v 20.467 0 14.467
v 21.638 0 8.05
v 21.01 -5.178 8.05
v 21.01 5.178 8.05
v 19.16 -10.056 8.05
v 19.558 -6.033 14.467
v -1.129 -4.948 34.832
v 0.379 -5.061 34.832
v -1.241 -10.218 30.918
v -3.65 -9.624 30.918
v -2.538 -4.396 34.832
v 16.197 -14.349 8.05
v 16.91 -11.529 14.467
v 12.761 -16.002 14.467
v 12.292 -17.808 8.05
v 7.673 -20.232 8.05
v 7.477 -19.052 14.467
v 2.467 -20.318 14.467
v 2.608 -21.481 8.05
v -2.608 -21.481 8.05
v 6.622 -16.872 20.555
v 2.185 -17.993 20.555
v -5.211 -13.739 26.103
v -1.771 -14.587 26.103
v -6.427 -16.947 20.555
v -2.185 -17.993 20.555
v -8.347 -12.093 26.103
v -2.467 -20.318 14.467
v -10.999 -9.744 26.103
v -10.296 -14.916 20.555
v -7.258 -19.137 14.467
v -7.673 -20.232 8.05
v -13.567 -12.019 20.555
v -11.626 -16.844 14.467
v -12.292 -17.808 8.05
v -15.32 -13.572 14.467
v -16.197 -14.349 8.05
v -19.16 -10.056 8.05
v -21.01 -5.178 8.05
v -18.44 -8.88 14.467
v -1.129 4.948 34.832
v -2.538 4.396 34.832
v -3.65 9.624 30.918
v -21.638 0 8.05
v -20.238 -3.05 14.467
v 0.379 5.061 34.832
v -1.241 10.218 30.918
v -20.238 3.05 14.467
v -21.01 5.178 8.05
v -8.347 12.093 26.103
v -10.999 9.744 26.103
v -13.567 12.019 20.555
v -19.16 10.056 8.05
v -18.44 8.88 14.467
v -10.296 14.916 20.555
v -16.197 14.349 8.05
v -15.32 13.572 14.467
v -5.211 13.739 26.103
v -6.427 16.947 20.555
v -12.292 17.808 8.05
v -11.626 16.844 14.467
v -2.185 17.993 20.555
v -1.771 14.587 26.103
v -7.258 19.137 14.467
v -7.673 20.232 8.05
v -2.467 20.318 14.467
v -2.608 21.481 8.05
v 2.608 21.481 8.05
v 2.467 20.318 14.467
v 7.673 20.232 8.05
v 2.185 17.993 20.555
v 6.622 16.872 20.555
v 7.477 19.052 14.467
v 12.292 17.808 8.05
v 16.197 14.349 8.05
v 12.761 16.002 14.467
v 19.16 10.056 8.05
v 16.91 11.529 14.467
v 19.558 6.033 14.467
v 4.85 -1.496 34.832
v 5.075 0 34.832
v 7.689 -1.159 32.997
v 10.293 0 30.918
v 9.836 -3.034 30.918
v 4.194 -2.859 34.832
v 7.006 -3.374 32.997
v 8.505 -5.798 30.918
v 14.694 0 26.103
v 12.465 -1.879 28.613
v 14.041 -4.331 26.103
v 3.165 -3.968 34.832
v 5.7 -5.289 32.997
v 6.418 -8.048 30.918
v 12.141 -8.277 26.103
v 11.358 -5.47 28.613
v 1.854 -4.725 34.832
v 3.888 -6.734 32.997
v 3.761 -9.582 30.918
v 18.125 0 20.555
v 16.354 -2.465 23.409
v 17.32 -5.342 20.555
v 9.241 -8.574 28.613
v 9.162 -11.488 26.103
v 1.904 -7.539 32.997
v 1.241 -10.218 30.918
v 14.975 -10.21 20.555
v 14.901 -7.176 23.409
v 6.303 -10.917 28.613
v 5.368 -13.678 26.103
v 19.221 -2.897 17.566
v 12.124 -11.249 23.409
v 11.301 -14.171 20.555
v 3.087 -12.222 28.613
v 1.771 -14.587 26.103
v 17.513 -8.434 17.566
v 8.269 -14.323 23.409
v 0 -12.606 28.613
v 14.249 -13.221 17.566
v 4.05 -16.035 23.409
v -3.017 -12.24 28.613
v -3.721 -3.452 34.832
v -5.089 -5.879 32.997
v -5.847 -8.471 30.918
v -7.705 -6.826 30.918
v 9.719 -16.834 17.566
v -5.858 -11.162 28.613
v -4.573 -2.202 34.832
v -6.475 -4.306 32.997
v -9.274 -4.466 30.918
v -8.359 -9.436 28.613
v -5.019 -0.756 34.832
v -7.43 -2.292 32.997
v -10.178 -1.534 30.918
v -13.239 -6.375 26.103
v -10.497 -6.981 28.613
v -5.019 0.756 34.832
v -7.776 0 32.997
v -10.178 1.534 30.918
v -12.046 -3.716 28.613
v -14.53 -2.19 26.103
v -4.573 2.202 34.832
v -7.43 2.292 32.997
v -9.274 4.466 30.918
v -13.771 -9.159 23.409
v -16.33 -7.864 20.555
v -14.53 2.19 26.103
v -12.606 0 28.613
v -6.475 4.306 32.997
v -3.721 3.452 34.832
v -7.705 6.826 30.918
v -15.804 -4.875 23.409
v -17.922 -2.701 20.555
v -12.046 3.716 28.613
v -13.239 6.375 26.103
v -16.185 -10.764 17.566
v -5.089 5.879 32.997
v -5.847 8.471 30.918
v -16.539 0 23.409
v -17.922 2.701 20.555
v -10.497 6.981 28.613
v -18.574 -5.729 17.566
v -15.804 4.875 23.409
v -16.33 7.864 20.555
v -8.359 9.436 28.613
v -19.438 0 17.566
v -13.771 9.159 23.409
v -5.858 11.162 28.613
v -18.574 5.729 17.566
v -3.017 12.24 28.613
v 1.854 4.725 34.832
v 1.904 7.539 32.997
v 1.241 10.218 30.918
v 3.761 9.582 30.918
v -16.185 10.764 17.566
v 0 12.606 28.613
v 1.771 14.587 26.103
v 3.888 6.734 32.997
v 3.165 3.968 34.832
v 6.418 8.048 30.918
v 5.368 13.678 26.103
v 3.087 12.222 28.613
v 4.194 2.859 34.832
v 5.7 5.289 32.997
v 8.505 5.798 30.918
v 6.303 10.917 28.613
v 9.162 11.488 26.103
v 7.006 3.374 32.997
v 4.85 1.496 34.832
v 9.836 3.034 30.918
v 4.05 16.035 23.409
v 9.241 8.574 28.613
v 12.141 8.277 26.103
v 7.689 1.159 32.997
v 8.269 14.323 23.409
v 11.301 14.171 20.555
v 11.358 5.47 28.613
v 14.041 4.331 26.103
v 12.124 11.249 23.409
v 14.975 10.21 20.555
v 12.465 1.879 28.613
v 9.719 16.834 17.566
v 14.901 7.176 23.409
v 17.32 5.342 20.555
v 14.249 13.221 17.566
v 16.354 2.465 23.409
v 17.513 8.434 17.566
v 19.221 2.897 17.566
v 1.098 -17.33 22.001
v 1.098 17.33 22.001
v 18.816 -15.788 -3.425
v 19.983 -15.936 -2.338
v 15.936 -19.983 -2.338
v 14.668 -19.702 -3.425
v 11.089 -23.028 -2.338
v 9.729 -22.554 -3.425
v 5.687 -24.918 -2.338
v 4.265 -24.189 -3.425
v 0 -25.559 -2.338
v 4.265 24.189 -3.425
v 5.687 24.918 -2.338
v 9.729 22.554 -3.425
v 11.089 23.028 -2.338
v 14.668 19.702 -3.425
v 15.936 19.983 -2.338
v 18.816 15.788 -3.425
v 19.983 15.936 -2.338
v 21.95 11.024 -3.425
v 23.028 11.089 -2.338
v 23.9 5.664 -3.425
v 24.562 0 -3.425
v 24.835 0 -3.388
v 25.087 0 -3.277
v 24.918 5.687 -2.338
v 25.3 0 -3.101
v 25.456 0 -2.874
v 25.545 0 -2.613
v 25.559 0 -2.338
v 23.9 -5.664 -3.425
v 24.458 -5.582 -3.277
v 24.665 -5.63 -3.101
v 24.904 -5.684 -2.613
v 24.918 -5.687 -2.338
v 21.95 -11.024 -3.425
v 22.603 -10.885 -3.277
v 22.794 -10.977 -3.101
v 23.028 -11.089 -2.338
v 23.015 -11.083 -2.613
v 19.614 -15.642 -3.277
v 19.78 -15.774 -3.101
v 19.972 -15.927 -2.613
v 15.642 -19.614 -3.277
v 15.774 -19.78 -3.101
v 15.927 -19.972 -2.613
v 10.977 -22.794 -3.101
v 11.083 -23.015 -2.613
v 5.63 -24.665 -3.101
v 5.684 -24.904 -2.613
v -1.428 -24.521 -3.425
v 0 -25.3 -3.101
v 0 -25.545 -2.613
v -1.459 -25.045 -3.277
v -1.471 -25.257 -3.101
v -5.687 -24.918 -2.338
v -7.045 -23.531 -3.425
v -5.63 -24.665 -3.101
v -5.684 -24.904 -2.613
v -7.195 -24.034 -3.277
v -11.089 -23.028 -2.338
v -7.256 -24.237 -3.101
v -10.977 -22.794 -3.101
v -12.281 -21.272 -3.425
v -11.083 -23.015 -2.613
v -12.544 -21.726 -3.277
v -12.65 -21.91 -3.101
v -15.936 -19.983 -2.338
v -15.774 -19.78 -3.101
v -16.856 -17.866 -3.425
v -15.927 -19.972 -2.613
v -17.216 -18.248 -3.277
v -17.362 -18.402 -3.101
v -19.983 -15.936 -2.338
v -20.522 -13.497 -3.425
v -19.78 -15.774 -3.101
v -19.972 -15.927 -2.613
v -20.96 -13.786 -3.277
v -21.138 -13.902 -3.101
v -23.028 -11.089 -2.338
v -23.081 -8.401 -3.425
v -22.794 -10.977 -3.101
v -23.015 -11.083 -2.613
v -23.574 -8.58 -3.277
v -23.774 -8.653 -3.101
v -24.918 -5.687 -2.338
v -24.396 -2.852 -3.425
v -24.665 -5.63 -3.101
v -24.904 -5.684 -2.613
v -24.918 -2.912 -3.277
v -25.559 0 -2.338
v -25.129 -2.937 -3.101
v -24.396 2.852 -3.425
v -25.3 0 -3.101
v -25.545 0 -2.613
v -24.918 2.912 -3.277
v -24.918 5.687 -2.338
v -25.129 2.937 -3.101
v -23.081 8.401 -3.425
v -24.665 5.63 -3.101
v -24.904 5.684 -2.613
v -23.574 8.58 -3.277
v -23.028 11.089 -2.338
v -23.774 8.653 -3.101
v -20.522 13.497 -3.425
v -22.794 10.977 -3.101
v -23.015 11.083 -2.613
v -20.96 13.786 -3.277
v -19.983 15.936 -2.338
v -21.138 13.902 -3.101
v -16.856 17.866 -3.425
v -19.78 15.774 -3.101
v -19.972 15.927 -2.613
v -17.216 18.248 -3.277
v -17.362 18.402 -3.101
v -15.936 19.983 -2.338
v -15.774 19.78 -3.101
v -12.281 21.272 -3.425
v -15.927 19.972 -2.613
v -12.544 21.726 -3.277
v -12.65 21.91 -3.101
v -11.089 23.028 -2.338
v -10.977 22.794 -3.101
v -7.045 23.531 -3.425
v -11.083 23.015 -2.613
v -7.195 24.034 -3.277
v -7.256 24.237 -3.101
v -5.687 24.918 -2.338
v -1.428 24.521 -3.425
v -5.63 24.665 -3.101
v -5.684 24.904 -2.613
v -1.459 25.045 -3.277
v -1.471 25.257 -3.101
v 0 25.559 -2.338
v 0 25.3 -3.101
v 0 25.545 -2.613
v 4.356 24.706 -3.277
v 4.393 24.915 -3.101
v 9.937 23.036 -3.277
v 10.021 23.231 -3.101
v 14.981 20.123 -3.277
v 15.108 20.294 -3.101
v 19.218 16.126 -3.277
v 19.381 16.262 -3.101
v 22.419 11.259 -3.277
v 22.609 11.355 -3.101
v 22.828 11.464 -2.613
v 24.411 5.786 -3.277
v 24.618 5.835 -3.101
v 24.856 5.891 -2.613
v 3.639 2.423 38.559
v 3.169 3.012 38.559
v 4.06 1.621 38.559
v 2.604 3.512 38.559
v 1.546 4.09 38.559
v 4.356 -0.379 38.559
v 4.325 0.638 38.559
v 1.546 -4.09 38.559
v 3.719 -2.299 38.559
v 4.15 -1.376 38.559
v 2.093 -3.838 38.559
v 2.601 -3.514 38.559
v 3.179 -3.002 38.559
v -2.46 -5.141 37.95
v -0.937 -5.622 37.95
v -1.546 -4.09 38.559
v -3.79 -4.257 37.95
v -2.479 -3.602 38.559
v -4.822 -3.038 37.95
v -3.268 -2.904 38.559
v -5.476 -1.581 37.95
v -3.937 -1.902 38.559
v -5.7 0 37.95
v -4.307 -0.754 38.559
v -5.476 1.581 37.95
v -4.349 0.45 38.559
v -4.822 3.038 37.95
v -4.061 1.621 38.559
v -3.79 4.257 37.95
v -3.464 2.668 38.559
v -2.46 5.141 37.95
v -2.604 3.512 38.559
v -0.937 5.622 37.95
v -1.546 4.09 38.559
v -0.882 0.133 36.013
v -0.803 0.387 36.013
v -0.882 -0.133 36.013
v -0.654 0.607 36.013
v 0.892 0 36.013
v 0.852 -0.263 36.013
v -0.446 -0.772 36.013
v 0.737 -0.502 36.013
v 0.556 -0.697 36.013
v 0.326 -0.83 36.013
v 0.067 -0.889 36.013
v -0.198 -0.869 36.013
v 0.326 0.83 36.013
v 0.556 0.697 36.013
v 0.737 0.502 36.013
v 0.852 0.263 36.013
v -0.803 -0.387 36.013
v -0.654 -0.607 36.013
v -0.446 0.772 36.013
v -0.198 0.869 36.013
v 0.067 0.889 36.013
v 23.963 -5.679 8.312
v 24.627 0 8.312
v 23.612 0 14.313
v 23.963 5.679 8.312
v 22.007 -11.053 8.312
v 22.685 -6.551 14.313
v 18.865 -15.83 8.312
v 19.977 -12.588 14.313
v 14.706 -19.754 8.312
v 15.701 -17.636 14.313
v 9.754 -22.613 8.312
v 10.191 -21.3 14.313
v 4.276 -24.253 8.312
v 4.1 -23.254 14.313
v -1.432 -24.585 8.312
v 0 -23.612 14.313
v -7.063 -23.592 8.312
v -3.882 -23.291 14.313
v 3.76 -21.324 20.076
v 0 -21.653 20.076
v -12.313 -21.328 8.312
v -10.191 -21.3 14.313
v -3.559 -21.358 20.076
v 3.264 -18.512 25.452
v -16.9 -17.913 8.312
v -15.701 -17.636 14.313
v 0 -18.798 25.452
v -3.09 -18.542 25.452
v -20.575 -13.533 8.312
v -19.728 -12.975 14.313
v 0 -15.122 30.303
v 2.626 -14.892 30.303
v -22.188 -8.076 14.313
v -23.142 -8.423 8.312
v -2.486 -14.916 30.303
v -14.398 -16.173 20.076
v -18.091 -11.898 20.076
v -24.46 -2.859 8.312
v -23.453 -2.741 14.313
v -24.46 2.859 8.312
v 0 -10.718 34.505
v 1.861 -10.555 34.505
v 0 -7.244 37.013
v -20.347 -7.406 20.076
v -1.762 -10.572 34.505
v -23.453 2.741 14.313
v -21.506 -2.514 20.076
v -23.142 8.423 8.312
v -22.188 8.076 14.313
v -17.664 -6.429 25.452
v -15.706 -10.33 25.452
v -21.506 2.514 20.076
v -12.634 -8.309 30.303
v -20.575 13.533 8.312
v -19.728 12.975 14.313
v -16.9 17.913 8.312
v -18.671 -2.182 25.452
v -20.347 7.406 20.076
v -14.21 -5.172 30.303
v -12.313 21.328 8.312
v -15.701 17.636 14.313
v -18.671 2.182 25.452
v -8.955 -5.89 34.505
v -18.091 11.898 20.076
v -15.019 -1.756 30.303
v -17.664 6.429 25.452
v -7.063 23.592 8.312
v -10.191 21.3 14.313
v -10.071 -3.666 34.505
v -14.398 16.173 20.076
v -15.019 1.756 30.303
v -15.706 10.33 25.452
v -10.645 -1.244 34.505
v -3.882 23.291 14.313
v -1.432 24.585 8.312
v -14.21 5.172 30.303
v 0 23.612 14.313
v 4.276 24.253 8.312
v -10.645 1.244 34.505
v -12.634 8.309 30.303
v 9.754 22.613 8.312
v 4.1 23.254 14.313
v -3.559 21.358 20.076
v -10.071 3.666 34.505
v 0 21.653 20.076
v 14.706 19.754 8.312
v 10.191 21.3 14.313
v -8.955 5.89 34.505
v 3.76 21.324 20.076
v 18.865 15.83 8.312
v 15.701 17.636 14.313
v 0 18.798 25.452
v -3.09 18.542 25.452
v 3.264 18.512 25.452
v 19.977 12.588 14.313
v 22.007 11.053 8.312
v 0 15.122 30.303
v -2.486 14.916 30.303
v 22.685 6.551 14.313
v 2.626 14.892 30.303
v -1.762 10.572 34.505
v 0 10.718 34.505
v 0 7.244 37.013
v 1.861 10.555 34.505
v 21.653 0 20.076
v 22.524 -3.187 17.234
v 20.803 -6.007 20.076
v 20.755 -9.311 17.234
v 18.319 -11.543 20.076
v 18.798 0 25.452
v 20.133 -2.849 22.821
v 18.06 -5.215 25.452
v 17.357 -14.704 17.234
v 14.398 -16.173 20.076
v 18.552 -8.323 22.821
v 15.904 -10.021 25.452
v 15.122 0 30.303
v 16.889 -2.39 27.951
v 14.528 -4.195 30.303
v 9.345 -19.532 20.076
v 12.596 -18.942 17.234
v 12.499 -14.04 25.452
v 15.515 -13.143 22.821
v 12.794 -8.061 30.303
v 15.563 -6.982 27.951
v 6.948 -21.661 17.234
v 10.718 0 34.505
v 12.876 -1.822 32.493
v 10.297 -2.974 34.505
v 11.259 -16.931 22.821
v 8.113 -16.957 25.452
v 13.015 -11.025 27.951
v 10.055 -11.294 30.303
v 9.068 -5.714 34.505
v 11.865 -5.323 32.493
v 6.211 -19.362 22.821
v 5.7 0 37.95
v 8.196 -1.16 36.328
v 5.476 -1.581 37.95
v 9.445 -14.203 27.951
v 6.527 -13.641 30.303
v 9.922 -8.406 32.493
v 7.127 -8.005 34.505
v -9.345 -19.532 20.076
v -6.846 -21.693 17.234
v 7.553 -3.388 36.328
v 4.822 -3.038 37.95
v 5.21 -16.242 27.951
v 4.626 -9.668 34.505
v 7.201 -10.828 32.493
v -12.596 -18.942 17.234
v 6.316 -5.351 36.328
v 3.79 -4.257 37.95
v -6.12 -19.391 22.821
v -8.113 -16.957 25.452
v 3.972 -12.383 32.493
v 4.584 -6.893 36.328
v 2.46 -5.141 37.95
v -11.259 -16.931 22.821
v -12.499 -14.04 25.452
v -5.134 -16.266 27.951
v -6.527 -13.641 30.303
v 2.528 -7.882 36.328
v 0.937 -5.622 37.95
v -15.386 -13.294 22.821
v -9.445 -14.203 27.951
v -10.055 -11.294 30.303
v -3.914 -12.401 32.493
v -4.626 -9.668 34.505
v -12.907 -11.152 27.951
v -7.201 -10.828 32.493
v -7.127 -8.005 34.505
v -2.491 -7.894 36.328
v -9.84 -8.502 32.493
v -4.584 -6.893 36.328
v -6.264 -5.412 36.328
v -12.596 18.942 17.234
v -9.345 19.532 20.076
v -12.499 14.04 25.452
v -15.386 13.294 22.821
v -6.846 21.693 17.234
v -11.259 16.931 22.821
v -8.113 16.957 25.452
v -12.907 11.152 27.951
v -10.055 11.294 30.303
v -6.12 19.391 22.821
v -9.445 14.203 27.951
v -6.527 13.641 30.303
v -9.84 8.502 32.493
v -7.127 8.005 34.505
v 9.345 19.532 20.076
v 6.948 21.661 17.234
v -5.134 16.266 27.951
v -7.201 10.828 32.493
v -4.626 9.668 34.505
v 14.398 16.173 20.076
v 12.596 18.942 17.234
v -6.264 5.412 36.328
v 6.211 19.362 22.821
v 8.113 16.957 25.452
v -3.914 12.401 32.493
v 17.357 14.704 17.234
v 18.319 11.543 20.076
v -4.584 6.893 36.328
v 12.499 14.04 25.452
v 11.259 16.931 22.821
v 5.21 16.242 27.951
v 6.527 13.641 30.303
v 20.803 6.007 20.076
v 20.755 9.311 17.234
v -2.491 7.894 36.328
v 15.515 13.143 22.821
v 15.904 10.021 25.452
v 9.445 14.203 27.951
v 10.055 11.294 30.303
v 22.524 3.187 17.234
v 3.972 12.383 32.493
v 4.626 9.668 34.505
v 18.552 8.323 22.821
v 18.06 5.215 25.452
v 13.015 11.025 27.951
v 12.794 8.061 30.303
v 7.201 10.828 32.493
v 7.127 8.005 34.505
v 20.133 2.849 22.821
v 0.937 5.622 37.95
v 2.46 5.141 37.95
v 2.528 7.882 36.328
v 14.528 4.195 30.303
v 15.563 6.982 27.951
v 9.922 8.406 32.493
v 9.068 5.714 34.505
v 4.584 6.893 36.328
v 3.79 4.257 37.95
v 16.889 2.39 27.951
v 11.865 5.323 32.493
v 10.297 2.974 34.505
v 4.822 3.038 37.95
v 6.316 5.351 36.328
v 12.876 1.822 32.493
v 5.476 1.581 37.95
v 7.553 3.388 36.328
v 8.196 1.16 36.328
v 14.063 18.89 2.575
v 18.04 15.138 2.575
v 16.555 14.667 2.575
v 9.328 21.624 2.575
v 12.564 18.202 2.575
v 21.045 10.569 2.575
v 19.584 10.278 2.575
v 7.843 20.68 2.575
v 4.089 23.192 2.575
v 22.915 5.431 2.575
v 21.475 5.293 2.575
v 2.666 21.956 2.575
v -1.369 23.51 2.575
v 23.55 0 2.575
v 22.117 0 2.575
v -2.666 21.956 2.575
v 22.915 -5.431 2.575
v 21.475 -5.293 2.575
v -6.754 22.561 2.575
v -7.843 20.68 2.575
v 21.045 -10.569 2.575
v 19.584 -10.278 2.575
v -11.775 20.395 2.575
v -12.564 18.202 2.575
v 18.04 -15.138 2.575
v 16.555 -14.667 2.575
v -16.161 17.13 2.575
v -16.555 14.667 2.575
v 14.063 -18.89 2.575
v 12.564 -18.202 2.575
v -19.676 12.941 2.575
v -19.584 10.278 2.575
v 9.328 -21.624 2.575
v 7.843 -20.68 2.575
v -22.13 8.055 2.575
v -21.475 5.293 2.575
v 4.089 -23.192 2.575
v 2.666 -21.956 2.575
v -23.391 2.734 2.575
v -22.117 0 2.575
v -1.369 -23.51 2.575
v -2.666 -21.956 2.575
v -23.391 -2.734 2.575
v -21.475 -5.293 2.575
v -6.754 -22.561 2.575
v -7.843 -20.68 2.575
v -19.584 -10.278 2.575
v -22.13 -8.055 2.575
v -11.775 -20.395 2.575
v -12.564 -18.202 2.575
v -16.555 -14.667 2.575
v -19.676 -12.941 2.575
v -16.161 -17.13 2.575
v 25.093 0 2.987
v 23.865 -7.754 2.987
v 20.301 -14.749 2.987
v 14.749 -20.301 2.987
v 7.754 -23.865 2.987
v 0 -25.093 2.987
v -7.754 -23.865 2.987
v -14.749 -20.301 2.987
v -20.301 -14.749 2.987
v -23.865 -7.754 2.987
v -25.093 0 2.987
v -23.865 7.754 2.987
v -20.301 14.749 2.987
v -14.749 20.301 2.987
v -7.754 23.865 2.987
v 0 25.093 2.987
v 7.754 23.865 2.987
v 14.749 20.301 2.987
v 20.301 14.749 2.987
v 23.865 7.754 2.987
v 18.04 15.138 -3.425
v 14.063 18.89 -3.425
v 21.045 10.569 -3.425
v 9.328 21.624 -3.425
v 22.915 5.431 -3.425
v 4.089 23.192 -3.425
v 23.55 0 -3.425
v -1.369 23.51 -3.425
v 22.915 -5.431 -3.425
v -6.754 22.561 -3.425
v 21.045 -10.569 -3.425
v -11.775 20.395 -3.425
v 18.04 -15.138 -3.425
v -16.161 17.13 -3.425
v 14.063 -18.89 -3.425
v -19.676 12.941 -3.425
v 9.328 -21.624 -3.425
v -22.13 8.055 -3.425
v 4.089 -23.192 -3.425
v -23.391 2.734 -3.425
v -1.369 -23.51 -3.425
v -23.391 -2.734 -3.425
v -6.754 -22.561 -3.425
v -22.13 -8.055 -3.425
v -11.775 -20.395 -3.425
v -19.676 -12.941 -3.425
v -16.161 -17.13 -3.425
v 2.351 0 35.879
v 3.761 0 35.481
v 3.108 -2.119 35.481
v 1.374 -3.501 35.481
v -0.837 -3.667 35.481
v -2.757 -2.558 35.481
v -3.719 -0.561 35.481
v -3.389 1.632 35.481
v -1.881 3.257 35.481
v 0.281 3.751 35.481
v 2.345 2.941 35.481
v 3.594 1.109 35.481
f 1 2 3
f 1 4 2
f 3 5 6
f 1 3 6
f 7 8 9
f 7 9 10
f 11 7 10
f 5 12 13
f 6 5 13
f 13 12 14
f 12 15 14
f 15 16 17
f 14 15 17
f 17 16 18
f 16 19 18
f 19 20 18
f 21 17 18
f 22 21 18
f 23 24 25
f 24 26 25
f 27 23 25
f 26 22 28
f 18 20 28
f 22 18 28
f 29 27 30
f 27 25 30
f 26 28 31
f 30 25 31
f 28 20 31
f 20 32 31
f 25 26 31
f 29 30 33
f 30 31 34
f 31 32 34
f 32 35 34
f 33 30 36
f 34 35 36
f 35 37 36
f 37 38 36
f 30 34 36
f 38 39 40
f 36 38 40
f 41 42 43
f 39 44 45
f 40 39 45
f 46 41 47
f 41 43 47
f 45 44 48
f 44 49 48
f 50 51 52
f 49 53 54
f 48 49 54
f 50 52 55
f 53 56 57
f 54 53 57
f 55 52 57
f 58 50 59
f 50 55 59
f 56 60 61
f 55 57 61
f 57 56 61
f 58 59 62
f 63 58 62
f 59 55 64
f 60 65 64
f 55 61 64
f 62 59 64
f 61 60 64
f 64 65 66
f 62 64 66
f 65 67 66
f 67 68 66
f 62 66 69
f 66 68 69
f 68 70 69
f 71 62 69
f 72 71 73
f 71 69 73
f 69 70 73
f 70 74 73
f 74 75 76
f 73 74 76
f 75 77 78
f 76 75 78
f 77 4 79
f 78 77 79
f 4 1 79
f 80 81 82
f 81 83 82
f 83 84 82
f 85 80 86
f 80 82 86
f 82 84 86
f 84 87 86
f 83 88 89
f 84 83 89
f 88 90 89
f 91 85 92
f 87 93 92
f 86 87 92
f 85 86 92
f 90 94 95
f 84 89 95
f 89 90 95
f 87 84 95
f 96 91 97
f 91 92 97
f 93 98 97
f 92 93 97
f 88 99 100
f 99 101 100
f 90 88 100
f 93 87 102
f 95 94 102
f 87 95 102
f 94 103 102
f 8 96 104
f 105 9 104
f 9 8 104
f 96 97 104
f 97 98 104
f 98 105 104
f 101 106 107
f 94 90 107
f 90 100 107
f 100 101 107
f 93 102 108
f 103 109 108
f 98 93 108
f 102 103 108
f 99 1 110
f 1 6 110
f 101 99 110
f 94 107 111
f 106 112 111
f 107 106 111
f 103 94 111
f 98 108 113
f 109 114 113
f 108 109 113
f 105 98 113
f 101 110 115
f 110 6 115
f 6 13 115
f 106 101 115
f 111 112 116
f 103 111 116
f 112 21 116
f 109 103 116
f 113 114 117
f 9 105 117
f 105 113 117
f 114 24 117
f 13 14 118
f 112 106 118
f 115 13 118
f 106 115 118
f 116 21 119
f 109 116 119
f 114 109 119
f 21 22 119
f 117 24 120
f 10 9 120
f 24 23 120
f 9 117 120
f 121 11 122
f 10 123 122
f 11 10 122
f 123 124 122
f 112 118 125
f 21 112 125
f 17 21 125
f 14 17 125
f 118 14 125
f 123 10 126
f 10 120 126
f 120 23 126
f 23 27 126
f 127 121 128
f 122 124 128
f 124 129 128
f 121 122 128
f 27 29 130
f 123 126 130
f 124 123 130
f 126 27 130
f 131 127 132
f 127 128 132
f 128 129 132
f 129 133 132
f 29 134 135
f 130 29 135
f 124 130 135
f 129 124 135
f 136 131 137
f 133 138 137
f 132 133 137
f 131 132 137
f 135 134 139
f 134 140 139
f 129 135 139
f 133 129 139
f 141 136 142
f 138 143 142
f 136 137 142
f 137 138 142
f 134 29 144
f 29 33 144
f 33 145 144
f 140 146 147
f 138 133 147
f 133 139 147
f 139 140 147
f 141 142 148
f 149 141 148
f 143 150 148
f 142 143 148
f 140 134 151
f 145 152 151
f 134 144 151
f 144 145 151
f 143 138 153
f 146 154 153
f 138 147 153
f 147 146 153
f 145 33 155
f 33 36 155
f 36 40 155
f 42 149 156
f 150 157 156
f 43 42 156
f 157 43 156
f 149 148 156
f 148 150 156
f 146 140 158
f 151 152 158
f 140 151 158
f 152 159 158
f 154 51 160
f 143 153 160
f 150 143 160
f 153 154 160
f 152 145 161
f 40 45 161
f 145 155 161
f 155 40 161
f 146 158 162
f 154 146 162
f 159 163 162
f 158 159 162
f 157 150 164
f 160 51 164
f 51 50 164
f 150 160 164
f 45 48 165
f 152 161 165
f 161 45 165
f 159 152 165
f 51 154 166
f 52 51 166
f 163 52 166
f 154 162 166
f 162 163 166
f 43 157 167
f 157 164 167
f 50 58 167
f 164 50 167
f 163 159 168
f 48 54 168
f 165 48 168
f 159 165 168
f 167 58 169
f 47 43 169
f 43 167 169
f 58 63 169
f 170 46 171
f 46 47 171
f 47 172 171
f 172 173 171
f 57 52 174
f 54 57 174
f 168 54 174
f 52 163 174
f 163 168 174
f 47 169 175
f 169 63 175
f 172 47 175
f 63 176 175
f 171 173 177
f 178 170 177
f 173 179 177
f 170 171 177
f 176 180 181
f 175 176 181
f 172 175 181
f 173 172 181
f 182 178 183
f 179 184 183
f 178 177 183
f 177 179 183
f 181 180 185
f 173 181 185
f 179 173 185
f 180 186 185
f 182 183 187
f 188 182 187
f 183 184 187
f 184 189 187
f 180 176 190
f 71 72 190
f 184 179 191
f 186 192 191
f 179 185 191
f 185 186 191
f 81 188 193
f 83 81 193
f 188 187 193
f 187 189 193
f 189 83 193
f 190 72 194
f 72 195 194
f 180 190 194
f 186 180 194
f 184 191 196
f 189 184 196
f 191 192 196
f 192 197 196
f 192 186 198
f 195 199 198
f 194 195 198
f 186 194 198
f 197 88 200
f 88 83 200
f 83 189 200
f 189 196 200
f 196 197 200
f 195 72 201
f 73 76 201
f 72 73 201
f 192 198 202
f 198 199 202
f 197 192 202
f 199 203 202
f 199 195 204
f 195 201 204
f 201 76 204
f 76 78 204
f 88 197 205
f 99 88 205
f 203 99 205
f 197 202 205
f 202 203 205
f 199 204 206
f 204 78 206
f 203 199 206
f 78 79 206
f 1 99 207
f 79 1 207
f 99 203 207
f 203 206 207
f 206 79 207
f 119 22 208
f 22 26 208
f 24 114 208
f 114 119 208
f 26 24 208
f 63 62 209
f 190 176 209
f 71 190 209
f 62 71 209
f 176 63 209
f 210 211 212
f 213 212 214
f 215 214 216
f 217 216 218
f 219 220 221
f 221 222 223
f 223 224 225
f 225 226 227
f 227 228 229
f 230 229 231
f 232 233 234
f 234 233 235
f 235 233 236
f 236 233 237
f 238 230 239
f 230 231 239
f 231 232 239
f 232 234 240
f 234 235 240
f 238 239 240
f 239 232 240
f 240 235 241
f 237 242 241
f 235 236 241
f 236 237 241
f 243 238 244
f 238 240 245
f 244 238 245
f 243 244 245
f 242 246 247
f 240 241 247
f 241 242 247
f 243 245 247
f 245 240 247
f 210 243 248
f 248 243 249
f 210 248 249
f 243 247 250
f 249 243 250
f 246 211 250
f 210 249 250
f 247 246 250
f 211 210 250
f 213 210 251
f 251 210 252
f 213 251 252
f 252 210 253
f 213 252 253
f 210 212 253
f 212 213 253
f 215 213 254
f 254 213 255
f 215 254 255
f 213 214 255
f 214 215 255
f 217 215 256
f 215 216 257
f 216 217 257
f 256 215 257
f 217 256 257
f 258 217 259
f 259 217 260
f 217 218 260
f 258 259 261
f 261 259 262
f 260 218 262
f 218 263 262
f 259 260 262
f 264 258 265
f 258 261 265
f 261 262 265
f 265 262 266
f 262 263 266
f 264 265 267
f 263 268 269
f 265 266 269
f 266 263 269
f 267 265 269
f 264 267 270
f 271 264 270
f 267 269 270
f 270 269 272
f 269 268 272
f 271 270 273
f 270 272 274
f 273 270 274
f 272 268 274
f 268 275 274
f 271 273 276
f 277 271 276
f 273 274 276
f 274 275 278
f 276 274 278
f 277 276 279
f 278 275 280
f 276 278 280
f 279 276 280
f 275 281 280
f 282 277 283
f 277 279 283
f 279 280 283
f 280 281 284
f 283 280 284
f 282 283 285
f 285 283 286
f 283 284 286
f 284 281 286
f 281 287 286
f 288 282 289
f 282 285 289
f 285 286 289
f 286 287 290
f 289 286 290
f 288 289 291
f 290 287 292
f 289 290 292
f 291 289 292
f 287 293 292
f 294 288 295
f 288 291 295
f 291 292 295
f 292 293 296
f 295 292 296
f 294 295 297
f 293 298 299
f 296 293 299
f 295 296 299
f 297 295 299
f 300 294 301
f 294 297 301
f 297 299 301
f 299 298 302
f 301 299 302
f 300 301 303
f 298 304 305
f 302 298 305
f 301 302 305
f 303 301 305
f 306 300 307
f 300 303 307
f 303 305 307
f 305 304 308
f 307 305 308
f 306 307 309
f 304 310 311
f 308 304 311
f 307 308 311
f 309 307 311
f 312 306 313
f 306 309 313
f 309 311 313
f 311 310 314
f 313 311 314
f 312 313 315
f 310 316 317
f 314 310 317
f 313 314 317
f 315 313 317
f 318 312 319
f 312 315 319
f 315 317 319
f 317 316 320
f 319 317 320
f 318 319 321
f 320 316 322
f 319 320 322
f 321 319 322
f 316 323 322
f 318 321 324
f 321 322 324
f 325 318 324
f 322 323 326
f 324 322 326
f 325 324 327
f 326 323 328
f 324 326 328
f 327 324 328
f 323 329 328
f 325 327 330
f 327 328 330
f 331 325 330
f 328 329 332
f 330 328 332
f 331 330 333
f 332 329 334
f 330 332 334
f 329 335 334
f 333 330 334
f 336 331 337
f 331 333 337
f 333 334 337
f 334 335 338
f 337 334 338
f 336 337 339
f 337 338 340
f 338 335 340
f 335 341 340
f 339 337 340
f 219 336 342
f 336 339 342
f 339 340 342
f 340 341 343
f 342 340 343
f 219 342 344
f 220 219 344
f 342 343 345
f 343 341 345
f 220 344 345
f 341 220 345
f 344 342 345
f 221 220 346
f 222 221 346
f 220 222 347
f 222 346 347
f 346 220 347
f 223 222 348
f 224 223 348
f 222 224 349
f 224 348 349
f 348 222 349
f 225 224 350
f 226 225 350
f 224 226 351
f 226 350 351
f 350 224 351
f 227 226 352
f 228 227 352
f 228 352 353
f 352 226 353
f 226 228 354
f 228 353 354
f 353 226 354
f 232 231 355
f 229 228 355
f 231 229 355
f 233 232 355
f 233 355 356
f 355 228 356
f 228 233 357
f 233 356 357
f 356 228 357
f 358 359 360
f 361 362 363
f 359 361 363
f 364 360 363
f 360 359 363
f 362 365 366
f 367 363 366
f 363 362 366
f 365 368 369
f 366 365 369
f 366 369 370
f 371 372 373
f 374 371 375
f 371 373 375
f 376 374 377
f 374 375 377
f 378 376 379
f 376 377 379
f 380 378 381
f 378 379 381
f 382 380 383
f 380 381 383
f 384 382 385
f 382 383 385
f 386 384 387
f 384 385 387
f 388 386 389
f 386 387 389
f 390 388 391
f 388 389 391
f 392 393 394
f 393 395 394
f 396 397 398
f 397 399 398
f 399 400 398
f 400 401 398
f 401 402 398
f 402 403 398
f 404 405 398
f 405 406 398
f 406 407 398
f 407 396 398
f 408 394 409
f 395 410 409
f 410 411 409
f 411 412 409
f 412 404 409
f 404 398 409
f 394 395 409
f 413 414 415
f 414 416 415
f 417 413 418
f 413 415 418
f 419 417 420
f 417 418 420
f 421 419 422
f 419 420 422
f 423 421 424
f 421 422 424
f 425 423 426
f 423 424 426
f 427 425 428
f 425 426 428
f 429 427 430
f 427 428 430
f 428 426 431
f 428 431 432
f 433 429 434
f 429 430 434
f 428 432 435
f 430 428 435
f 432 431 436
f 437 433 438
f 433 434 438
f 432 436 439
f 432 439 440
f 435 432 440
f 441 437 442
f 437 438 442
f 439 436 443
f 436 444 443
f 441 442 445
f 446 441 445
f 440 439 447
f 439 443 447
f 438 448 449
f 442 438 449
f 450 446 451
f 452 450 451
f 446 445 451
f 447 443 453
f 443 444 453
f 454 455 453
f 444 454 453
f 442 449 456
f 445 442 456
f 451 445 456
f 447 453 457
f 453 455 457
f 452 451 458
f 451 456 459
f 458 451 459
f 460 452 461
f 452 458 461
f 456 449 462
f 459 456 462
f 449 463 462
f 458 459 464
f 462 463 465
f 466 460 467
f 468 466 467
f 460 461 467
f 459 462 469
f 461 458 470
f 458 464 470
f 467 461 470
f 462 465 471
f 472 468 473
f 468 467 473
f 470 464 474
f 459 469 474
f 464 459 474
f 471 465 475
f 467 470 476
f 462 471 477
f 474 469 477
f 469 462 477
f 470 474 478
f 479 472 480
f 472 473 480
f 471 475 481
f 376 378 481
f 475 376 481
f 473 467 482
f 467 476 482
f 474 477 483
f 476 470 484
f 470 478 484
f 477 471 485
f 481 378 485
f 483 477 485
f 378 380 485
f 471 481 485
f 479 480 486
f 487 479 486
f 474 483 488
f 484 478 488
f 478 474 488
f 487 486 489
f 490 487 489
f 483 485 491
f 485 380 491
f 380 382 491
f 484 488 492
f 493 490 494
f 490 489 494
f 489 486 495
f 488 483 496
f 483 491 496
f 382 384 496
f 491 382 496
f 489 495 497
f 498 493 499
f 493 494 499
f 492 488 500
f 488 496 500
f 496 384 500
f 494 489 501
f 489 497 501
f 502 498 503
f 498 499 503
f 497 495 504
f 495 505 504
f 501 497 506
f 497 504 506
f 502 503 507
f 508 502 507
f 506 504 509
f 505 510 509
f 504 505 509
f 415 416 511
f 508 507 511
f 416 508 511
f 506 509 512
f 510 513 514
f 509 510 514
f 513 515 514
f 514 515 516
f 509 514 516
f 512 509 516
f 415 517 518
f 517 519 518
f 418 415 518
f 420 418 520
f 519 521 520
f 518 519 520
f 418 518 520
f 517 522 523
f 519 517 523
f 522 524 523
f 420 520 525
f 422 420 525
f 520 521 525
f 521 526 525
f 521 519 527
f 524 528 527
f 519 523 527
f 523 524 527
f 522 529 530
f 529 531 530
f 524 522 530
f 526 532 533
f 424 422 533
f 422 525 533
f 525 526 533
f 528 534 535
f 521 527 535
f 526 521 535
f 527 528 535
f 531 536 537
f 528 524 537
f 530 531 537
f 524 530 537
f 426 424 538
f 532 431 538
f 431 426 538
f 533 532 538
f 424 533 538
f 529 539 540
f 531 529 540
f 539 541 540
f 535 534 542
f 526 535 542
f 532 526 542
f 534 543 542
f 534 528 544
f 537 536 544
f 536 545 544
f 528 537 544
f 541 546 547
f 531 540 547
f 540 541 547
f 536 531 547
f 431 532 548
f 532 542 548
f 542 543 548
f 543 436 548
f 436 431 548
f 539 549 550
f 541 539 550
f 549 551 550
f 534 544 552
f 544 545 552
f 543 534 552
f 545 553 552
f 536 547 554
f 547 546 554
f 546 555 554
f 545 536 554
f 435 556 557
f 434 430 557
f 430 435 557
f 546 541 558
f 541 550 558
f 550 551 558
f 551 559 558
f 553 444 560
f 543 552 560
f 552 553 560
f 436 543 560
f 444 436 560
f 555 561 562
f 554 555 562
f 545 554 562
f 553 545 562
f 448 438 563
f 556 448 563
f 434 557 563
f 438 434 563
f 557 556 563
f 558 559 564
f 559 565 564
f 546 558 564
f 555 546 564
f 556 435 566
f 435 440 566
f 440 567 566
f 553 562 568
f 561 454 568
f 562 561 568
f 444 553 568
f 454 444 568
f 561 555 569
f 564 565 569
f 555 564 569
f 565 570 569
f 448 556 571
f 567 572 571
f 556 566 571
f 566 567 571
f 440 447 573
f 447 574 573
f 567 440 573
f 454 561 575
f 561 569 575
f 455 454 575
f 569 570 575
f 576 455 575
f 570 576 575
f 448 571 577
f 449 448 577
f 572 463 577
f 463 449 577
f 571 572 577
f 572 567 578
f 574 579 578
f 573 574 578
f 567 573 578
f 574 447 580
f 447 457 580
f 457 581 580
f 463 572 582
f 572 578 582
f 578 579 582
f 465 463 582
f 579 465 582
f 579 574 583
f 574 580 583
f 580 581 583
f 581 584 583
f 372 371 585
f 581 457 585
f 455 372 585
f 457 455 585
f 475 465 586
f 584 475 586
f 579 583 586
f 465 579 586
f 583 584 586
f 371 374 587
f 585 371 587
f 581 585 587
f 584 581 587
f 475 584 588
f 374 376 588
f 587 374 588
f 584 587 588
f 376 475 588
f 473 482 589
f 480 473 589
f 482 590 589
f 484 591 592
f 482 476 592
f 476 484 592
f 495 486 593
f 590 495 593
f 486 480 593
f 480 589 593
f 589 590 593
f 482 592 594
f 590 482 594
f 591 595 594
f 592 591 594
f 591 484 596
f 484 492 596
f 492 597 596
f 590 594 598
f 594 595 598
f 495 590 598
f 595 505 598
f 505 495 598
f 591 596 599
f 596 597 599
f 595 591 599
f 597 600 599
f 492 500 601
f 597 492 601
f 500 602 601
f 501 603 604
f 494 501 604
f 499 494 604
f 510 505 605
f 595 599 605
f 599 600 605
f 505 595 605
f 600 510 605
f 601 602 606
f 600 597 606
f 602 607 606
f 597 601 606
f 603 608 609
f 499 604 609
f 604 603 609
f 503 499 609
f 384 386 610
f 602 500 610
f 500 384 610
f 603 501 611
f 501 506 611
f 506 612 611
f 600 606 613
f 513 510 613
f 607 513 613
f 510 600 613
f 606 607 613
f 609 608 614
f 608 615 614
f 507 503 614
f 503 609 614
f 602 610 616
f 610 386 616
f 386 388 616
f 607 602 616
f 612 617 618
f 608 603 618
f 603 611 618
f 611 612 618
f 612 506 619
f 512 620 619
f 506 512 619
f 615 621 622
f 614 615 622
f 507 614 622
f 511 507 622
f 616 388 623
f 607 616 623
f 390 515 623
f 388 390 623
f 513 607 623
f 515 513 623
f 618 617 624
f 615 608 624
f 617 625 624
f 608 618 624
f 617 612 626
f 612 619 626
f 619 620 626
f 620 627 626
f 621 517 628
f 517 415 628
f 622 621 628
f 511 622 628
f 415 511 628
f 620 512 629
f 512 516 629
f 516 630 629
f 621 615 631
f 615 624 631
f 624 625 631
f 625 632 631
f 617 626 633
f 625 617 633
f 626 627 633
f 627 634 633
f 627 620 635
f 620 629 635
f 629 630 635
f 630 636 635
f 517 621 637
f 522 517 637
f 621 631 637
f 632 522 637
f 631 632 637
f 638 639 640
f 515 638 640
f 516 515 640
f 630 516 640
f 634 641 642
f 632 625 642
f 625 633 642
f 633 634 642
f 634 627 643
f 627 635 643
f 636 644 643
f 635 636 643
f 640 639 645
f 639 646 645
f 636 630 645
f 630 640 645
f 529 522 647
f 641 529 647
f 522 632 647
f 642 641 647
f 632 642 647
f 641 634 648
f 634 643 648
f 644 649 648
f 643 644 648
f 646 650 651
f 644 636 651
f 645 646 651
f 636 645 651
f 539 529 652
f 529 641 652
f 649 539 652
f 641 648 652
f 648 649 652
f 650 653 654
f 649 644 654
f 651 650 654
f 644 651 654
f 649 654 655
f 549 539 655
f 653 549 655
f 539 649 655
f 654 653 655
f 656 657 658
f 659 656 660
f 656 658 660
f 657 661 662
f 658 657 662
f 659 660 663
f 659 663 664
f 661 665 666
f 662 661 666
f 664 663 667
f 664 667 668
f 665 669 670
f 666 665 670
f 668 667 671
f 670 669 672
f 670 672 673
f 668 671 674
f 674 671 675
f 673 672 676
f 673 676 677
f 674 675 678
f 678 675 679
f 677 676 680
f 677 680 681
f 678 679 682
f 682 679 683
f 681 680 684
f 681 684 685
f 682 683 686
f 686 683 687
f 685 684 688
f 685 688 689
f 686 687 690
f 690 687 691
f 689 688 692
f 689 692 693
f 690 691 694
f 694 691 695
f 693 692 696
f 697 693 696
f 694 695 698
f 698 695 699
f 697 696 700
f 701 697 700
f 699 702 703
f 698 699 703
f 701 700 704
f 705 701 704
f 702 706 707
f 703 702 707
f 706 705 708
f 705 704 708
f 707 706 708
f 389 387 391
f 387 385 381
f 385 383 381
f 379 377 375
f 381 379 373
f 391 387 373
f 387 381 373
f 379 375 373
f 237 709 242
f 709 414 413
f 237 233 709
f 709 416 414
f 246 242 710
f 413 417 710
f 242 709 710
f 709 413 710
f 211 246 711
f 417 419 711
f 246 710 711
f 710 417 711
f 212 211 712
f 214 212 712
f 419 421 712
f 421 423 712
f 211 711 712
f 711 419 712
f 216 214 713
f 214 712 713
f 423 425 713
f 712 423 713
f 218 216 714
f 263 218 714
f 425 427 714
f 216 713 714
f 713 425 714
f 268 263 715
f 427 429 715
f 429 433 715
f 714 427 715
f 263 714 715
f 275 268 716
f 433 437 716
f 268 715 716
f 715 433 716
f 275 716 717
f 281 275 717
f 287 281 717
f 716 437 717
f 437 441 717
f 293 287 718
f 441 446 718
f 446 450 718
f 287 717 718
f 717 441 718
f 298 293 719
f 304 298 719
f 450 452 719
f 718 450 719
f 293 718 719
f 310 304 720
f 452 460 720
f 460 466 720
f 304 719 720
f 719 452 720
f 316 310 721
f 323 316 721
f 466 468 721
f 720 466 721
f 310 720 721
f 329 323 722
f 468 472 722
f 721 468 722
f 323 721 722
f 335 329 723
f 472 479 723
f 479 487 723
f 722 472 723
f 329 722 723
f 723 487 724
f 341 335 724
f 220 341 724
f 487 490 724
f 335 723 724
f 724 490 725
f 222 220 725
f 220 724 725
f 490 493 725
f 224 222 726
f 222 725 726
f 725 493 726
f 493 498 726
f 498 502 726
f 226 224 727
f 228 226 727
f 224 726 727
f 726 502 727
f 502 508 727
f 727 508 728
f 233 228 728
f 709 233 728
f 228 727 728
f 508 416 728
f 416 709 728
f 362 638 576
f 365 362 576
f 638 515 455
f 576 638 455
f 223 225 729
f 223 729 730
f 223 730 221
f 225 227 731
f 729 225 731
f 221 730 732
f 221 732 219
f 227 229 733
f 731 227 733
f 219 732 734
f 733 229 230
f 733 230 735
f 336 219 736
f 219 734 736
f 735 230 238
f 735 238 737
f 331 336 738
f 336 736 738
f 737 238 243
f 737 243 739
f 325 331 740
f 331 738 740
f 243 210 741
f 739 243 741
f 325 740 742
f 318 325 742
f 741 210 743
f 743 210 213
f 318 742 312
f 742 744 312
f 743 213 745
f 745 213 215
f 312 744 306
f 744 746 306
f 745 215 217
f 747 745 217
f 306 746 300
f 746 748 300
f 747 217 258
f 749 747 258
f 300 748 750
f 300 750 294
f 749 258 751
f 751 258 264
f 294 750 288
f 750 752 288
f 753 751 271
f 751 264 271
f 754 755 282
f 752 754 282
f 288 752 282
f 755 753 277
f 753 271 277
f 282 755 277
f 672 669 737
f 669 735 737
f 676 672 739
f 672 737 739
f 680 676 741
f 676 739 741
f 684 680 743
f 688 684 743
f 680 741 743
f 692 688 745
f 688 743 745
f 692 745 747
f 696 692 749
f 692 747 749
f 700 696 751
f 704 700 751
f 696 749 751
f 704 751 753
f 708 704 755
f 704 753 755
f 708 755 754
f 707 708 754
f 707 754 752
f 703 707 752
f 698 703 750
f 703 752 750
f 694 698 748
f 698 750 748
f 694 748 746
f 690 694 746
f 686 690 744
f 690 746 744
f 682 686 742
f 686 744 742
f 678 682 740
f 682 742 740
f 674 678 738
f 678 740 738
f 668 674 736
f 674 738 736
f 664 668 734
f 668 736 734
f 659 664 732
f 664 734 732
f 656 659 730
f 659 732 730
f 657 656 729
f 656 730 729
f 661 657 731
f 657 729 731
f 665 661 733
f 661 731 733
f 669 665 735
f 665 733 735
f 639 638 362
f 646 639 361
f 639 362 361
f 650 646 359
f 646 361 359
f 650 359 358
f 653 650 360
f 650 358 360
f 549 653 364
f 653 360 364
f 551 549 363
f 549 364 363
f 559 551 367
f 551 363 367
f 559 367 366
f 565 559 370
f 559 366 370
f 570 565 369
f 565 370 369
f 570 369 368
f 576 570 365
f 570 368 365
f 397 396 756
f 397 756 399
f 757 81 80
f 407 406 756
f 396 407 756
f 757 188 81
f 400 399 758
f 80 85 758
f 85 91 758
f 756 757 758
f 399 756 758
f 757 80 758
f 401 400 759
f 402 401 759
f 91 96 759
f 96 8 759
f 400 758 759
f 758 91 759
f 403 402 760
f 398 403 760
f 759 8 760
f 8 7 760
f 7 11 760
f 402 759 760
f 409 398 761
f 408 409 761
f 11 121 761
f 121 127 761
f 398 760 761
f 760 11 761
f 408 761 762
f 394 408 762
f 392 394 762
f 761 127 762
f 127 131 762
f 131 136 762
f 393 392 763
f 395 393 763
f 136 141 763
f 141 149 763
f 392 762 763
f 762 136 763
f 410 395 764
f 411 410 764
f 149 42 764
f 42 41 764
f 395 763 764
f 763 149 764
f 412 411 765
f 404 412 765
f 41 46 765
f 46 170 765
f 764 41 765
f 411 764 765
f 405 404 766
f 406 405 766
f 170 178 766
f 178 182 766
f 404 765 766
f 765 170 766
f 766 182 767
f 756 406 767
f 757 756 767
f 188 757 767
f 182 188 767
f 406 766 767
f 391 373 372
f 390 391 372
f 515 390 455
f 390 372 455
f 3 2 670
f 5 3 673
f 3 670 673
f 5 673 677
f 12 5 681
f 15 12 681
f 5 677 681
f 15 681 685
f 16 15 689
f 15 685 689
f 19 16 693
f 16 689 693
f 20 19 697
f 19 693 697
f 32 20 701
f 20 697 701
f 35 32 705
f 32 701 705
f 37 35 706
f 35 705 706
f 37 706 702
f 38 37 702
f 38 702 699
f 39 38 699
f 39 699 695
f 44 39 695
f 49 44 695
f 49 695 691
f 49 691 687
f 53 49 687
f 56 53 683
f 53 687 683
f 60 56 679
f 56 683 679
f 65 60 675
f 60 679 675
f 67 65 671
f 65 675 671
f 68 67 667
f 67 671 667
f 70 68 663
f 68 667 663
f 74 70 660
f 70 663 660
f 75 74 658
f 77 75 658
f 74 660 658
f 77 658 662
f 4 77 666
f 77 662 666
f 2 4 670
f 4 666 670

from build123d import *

# Parameters (mm, degrees)
F3_DEPTH = 12.5


with BuildPart() as f1:
    # F0 (on Front) → F1 (revolve)
    with BuildSketch(Plane.XZ):
        with BuildLine():
            ThreePointArc((5.075488, 34.832052), (16.538947, 23.409023), (21.638337, 8.050224))
            Line((21.638337, 8.050224), (22.117398, 2.574537))
            Line((22.117398, 2.574537), (23.55, 2.574537))
            Line((23.55, 2.574537), (23.55, -3.425463))
            Line((23.55, -3.425463), (24.562481, -3.425463))
            ThreePointArc((24.562481, -3.425463), (25.299759, -3.101054), (25.558676, -2.338308))
            Line((25.558676, -2.338308), (24.626922, 8.311692))
            ThreePointArc((24.626922, 8.311692), (18.798074, 25.452158), (5.699575, 37.950174))
            ThreePointArc((5.699575, 37.950174), (3.776831, 38.742911), (1.714722, 39.013247))
            Line((1.714722, 39.013247), (0, 39.013247))
            Line((0, 39.013247), (0, 36.013246))
            Line((0, 36.013246), (0.891724, 36.013246))
            ThreePointArc((0.891724, 36.013246), (3.065379, 35.712286), (5.075488, 34.832052))
        make_face()
    revolve(axis=Axis((0, 0, 37.513246), (0, 0, -1)))

    # F2 (on Front) → F3 (cut, symmetric)
    with BuildSketch(Plane.XZ):
        Polygon((-9.073464, 38.558992), (-1.545745, 38.558992), (0, 37.013247), (1.545745, 38.558992), (9.073464, 38.558992), (9.073464, 40.632625), (3.619377, 40.632625), (-3.619377, 40.632625), (-9.073464, 40.632625), align=None)
    extrude(amount=F3_DEPTH, both=True, mode=Mode.SUBTRACT)


solid = f1.part
